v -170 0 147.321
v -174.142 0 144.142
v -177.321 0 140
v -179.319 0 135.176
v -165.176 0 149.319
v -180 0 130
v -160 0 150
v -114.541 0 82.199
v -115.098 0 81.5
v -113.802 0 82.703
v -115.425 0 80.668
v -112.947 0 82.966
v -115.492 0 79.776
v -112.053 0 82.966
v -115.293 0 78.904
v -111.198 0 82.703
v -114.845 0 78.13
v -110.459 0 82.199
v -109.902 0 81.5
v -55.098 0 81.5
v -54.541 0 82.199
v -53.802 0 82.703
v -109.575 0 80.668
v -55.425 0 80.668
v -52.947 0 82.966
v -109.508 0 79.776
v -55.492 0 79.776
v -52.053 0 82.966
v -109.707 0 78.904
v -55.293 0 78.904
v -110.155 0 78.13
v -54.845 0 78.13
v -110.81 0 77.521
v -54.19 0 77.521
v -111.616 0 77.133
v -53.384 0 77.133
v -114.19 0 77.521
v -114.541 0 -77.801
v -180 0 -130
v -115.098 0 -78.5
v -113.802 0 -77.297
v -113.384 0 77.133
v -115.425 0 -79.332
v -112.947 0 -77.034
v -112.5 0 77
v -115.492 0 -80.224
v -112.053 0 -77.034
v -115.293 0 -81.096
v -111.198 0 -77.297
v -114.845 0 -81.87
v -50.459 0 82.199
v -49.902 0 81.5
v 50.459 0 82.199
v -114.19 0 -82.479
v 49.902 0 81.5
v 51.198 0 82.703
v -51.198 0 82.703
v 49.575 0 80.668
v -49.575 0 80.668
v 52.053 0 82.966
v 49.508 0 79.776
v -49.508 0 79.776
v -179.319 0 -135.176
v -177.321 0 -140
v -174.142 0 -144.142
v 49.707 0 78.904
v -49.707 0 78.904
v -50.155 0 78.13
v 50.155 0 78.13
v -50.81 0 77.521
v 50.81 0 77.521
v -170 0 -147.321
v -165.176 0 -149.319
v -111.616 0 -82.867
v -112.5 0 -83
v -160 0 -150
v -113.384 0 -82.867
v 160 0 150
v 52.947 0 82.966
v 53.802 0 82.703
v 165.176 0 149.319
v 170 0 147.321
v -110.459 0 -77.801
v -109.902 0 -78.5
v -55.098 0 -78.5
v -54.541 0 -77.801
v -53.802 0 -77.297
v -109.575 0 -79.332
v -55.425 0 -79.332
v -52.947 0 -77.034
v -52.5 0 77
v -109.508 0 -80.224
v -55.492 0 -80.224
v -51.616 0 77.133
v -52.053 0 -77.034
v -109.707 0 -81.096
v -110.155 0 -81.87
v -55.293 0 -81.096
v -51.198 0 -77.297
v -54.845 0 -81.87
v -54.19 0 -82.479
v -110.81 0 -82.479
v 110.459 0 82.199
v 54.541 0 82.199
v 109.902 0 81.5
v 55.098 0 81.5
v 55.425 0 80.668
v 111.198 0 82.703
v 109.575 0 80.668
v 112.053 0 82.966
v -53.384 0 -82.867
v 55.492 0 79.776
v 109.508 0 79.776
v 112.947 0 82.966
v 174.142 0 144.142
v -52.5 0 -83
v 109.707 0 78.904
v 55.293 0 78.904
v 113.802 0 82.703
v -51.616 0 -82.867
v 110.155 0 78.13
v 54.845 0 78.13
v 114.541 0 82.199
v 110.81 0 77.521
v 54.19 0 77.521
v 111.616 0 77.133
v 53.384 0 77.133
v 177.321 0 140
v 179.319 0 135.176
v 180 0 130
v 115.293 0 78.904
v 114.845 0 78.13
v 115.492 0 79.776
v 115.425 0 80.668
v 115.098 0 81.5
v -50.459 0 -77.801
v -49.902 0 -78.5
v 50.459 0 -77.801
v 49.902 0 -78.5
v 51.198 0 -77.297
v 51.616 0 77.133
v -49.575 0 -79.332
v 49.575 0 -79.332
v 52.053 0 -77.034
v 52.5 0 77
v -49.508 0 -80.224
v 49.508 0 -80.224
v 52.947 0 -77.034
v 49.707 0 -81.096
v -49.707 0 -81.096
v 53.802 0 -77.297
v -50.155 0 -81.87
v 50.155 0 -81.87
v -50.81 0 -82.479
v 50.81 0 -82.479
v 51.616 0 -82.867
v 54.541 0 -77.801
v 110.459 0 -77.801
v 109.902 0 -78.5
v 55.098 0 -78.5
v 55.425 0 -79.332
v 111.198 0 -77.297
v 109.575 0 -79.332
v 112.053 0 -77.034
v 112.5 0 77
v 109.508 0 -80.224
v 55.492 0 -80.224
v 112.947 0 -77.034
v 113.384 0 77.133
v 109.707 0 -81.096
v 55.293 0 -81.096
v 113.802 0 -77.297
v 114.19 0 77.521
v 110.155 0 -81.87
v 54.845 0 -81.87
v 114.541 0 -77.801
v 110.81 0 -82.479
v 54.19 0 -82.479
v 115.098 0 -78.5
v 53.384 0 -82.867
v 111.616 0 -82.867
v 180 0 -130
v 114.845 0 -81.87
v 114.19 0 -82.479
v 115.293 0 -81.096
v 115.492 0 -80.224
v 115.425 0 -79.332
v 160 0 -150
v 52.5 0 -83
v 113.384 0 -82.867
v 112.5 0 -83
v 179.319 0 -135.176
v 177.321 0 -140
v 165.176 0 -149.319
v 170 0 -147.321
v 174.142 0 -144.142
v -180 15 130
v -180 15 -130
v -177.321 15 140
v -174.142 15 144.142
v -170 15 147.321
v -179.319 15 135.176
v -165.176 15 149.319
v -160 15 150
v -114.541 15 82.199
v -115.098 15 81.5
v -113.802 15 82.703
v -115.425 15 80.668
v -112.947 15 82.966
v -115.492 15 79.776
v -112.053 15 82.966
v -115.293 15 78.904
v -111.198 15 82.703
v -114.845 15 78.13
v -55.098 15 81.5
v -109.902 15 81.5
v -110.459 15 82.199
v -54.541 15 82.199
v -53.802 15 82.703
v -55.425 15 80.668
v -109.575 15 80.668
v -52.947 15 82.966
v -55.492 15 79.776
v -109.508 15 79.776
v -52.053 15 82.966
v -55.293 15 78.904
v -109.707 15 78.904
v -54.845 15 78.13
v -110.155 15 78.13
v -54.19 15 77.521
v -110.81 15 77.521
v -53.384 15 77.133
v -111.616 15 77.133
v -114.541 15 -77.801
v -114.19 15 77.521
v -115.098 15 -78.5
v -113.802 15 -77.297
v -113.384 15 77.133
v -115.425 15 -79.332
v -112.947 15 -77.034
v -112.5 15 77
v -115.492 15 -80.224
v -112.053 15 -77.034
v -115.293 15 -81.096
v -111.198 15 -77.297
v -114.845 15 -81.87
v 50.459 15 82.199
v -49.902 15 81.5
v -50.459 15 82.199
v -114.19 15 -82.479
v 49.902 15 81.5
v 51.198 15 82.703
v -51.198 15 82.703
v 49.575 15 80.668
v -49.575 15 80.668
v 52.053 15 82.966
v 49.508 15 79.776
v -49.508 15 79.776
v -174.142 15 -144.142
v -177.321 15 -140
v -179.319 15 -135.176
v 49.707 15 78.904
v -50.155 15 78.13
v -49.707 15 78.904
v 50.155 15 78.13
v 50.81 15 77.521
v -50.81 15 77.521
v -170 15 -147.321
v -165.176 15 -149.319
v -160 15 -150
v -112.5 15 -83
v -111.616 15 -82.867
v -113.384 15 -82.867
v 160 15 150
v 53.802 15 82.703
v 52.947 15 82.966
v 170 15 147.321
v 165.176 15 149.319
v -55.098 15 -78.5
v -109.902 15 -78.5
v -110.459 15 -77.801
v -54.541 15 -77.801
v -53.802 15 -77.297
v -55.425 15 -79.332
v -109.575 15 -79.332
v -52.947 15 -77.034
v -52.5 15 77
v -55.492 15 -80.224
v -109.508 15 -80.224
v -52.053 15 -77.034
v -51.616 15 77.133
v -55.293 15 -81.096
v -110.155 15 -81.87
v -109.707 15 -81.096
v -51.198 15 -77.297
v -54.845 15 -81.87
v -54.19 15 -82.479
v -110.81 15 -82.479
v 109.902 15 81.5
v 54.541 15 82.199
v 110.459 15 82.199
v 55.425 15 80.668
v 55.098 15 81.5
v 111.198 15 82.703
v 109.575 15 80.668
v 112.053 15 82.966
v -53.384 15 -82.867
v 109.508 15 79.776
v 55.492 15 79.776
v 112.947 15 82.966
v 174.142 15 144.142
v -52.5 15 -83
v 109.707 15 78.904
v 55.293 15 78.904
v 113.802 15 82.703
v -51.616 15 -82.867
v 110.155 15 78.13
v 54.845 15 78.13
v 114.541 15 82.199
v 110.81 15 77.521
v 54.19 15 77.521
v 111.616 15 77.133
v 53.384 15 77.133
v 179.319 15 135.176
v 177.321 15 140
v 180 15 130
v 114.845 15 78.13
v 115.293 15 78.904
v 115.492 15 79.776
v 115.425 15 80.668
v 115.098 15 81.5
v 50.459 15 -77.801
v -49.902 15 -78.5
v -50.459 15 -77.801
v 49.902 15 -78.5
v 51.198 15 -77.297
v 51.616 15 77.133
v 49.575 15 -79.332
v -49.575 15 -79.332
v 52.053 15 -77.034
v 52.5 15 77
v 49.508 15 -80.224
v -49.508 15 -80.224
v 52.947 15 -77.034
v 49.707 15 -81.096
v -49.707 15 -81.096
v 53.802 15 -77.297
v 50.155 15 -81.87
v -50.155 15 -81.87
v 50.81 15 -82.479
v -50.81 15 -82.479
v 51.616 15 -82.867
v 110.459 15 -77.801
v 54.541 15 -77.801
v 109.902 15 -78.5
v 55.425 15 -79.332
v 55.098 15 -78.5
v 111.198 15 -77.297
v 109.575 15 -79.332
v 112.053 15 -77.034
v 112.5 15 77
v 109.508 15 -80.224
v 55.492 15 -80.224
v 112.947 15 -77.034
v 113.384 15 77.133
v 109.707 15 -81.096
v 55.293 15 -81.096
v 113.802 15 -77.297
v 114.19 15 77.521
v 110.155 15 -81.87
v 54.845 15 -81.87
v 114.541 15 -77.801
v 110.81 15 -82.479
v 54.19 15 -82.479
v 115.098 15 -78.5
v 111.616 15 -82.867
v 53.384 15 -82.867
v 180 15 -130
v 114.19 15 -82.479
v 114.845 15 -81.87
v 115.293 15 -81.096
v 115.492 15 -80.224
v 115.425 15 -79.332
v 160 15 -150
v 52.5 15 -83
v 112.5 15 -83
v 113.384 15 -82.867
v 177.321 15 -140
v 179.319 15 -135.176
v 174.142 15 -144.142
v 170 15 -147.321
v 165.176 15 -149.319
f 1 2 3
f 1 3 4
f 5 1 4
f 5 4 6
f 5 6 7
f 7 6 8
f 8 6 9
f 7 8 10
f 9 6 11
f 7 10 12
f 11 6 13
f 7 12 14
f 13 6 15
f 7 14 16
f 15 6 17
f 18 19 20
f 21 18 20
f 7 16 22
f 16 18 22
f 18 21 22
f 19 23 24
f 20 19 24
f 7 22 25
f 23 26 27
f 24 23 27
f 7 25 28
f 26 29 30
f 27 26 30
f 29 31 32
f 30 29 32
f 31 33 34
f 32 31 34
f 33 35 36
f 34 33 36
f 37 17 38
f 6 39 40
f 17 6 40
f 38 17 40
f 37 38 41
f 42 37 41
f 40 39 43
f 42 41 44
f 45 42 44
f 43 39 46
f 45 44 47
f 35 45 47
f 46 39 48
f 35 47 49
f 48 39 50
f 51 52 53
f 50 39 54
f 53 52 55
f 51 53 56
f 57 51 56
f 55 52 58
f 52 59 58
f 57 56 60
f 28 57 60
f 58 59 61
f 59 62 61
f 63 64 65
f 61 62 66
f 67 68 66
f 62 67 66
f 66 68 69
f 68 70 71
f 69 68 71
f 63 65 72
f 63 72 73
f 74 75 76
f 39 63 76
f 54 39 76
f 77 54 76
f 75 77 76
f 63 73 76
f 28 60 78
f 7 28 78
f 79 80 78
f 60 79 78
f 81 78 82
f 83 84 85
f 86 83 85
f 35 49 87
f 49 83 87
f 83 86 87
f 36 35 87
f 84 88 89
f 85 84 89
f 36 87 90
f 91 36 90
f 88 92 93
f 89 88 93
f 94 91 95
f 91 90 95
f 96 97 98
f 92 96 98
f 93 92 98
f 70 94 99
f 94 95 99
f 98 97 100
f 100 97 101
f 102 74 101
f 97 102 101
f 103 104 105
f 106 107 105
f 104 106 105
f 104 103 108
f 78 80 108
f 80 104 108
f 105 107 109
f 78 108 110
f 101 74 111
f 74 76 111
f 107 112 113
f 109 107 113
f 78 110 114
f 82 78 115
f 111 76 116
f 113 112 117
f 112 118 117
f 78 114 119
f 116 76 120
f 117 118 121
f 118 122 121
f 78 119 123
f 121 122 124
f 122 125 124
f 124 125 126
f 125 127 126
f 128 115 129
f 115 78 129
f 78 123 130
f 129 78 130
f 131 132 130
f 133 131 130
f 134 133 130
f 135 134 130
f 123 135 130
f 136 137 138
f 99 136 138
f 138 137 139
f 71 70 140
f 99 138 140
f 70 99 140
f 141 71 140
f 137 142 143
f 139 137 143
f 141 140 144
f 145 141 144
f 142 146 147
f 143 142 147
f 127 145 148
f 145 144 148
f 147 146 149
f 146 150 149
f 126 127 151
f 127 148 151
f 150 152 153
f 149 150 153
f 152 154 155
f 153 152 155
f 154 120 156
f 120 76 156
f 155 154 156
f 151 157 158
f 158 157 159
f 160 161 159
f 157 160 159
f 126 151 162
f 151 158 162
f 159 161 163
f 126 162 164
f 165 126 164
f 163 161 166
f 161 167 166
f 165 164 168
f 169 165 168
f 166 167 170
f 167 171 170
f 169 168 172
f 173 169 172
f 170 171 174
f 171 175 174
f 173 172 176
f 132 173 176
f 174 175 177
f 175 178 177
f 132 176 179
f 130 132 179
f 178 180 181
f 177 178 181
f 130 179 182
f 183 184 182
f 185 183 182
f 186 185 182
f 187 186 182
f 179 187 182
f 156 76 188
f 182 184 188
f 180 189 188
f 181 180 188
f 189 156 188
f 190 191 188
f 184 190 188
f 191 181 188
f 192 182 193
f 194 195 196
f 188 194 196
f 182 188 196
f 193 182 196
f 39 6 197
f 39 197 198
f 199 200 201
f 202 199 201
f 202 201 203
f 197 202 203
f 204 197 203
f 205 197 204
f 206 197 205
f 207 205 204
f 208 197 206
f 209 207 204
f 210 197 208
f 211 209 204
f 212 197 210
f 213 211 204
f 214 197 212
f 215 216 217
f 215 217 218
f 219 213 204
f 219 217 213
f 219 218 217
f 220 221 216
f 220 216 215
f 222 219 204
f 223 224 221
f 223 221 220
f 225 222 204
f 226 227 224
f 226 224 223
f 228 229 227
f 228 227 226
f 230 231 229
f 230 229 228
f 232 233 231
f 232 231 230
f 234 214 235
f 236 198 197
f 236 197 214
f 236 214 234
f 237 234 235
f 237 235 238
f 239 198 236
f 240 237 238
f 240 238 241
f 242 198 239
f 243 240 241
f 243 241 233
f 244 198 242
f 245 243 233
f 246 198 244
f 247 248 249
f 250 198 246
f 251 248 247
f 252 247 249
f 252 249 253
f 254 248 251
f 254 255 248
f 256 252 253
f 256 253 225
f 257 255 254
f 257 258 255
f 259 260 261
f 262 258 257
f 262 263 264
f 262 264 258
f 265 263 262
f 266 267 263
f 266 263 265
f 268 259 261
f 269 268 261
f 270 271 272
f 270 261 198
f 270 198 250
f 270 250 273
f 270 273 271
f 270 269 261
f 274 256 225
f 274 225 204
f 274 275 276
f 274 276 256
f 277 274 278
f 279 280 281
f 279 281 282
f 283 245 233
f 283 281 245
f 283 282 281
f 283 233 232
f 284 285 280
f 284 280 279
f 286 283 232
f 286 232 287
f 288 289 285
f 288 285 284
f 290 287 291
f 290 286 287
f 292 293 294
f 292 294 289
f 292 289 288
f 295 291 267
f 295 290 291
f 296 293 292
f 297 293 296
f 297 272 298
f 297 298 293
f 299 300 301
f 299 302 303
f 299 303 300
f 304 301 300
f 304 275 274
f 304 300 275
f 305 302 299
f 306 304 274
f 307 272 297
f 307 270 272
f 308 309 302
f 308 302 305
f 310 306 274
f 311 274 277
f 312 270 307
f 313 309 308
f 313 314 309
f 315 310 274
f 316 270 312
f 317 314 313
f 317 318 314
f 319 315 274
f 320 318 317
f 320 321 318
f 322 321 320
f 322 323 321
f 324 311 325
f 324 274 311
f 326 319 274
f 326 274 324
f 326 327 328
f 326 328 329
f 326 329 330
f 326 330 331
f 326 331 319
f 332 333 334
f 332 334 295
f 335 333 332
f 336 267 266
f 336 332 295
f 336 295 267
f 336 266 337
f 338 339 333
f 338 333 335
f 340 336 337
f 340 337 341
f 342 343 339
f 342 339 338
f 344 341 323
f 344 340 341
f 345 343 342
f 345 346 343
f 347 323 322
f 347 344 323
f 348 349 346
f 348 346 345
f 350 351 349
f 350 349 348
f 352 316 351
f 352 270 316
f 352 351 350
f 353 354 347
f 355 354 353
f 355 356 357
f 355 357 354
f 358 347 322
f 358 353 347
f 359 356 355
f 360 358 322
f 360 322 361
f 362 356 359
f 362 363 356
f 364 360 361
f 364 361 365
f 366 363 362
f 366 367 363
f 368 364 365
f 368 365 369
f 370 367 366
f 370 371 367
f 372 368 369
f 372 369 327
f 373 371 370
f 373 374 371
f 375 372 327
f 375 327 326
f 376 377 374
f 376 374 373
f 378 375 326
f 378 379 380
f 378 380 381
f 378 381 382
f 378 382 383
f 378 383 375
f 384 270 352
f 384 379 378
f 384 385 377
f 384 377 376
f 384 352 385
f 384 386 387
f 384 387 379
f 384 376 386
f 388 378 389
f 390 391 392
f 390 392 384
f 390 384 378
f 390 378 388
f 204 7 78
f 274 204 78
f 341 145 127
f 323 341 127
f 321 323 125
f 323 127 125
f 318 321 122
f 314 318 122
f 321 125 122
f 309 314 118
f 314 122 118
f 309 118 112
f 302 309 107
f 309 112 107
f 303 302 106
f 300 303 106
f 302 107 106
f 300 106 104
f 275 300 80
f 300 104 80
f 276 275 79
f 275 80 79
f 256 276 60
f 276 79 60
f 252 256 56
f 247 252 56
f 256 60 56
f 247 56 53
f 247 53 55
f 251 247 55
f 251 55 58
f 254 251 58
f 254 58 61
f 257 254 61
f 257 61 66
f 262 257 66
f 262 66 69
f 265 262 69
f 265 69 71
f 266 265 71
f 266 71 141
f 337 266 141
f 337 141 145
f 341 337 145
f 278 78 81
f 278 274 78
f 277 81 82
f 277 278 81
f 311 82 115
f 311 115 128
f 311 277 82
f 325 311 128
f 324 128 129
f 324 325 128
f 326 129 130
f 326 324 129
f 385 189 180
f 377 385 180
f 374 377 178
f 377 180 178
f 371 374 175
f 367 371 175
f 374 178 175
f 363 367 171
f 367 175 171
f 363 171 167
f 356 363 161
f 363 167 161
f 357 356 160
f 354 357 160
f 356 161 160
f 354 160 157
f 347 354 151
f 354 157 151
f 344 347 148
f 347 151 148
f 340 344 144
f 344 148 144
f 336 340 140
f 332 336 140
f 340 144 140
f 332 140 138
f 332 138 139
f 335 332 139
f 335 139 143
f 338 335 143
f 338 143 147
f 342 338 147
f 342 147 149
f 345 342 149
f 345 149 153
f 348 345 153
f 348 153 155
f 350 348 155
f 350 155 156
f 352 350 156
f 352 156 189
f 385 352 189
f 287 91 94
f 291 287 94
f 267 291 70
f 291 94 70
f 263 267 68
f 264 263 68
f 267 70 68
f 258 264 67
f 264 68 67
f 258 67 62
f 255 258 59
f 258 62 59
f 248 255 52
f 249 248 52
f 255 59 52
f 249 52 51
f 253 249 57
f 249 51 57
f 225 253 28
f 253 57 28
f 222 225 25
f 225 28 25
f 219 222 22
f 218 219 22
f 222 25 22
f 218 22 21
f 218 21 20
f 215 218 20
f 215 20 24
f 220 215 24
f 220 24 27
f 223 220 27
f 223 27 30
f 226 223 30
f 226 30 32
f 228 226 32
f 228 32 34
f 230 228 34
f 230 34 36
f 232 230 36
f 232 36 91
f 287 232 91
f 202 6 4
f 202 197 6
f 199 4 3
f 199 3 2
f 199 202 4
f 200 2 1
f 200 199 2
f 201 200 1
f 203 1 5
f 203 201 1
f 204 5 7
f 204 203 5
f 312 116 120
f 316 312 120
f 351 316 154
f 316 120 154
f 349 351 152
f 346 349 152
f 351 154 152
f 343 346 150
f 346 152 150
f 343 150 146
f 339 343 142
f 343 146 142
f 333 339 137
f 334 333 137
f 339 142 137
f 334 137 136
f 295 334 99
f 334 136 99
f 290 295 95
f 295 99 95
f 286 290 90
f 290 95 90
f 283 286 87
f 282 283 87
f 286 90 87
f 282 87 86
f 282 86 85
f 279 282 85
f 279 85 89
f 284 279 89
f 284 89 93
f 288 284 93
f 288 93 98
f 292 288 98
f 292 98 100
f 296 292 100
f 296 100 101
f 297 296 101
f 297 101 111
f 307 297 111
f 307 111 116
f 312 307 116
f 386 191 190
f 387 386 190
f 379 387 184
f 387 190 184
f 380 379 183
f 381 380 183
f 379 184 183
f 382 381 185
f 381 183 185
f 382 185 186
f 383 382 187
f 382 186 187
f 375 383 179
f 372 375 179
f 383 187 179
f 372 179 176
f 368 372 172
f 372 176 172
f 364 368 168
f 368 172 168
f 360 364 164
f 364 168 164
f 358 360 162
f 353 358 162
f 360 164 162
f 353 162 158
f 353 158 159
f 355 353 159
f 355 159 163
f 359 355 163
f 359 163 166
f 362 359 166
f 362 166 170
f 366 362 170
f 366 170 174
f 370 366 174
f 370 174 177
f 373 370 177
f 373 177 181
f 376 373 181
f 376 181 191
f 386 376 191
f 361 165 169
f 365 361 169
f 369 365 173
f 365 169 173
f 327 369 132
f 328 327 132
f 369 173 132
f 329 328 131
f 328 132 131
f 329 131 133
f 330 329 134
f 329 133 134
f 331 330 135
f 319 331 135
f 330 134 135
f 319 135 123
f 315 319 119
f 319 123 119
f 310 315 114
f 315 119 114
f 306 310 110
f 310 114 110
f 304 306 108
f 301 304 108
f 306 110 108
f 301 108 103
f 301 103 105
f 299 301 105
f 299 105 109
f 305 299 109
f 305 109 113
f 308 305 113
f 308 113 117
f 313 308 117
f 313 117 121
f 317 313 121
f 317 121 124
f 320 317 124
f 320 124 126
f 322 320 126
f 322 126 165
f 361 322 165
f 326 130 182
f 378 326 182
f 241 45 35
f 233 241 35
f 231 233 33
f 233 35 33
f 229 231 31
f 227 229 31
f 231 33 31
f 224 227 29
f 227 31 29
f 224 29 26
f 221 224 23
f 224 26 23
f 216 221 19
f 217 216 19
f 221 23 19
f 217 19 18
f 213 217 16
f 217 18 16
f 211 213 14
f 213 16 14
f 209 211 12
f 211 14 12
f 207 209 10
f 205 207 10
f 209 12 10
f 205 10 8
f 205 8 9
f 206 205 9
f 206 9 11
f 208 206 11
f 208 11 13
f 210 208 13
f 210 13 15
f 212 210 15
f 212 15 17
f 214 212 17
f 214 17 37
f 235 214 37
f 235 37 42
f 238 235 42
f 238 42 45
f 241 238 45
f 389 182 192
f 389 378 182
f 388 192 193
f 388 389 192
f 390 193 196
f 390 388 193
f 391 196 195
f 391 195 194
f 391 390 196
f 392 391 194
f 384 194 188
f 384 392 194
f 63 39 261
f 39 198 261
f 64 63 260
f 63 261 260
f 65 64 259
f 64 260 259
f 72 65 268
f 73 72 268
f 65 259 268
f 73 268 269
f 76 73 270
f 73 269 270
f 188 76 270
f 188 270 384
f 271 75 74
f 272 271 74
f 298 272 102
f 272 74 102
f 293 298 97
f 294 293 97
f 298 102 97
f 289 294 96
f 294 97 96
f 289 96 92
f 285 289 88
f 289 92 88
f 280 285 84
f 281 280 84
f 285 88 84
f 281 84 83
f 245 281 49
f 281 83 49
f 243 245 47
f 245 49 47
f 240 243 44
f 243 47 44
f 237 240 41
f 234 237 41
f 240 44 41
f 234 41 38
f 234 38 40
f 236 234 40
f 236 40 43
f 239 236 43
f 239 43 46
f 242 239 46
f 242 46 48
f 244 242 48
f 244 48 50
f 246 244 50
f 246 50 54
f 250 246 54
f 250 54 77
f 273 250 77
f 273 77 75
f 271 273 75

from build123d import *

# Parameters (mm, degrees)
SKETCH2_W                 = 360
SKETCH2_H                 = 300
BOSS_EXTRUDE1_DEPTH       = 15
FILLET1_R                 = 20
F_6_0MM_DOWEL_HOLE1_D     = 6
F_6_0MM_DOWEL_HOLE1_DEPTH = 15


with BuildPart() as part:
    # Sketch2 → Boss-Extrude1 (new body)
    with BuildSketch(Plane(origin=(0, 0, 0), x_dir=(1, 0, 0), z_dir=(0, 1, 0))):
        Rectangle(SKETCH2_W, SKETCH2_H)
    extrude(amount=BOSS_EXTRUDE1_DEPTH)

    # Fillet1
    fillet1_edges = [part.edges().sort_by_distance(p)[0] for p in [
        (180, 7.5, 150),
        (-180, 7.5, 150),
        (-180, 7.5, -150),
        (180, 7.5, -150),
    ]]
    fillet(fillet1_edges, radius=FILLET1_R)

    # Ø6.0mm Dowel Hole1
    with Locations(Plane(origin=(-112.5, 15, 80), x_dir=(0, 0, 1), z_dir=(0, 1, 0))):
        with Locations((0, 0), (0, 60), (0, 165), (0, 225), (-160, 225), (-160, 165), (-160, 60), (-160, 0)):
            Hole(F_6_0MM_DOWEL_HOLE1_D / 2, depth=F_6_0MM_DOWEL_HOLE1_DEPTH)


solid = part.part
